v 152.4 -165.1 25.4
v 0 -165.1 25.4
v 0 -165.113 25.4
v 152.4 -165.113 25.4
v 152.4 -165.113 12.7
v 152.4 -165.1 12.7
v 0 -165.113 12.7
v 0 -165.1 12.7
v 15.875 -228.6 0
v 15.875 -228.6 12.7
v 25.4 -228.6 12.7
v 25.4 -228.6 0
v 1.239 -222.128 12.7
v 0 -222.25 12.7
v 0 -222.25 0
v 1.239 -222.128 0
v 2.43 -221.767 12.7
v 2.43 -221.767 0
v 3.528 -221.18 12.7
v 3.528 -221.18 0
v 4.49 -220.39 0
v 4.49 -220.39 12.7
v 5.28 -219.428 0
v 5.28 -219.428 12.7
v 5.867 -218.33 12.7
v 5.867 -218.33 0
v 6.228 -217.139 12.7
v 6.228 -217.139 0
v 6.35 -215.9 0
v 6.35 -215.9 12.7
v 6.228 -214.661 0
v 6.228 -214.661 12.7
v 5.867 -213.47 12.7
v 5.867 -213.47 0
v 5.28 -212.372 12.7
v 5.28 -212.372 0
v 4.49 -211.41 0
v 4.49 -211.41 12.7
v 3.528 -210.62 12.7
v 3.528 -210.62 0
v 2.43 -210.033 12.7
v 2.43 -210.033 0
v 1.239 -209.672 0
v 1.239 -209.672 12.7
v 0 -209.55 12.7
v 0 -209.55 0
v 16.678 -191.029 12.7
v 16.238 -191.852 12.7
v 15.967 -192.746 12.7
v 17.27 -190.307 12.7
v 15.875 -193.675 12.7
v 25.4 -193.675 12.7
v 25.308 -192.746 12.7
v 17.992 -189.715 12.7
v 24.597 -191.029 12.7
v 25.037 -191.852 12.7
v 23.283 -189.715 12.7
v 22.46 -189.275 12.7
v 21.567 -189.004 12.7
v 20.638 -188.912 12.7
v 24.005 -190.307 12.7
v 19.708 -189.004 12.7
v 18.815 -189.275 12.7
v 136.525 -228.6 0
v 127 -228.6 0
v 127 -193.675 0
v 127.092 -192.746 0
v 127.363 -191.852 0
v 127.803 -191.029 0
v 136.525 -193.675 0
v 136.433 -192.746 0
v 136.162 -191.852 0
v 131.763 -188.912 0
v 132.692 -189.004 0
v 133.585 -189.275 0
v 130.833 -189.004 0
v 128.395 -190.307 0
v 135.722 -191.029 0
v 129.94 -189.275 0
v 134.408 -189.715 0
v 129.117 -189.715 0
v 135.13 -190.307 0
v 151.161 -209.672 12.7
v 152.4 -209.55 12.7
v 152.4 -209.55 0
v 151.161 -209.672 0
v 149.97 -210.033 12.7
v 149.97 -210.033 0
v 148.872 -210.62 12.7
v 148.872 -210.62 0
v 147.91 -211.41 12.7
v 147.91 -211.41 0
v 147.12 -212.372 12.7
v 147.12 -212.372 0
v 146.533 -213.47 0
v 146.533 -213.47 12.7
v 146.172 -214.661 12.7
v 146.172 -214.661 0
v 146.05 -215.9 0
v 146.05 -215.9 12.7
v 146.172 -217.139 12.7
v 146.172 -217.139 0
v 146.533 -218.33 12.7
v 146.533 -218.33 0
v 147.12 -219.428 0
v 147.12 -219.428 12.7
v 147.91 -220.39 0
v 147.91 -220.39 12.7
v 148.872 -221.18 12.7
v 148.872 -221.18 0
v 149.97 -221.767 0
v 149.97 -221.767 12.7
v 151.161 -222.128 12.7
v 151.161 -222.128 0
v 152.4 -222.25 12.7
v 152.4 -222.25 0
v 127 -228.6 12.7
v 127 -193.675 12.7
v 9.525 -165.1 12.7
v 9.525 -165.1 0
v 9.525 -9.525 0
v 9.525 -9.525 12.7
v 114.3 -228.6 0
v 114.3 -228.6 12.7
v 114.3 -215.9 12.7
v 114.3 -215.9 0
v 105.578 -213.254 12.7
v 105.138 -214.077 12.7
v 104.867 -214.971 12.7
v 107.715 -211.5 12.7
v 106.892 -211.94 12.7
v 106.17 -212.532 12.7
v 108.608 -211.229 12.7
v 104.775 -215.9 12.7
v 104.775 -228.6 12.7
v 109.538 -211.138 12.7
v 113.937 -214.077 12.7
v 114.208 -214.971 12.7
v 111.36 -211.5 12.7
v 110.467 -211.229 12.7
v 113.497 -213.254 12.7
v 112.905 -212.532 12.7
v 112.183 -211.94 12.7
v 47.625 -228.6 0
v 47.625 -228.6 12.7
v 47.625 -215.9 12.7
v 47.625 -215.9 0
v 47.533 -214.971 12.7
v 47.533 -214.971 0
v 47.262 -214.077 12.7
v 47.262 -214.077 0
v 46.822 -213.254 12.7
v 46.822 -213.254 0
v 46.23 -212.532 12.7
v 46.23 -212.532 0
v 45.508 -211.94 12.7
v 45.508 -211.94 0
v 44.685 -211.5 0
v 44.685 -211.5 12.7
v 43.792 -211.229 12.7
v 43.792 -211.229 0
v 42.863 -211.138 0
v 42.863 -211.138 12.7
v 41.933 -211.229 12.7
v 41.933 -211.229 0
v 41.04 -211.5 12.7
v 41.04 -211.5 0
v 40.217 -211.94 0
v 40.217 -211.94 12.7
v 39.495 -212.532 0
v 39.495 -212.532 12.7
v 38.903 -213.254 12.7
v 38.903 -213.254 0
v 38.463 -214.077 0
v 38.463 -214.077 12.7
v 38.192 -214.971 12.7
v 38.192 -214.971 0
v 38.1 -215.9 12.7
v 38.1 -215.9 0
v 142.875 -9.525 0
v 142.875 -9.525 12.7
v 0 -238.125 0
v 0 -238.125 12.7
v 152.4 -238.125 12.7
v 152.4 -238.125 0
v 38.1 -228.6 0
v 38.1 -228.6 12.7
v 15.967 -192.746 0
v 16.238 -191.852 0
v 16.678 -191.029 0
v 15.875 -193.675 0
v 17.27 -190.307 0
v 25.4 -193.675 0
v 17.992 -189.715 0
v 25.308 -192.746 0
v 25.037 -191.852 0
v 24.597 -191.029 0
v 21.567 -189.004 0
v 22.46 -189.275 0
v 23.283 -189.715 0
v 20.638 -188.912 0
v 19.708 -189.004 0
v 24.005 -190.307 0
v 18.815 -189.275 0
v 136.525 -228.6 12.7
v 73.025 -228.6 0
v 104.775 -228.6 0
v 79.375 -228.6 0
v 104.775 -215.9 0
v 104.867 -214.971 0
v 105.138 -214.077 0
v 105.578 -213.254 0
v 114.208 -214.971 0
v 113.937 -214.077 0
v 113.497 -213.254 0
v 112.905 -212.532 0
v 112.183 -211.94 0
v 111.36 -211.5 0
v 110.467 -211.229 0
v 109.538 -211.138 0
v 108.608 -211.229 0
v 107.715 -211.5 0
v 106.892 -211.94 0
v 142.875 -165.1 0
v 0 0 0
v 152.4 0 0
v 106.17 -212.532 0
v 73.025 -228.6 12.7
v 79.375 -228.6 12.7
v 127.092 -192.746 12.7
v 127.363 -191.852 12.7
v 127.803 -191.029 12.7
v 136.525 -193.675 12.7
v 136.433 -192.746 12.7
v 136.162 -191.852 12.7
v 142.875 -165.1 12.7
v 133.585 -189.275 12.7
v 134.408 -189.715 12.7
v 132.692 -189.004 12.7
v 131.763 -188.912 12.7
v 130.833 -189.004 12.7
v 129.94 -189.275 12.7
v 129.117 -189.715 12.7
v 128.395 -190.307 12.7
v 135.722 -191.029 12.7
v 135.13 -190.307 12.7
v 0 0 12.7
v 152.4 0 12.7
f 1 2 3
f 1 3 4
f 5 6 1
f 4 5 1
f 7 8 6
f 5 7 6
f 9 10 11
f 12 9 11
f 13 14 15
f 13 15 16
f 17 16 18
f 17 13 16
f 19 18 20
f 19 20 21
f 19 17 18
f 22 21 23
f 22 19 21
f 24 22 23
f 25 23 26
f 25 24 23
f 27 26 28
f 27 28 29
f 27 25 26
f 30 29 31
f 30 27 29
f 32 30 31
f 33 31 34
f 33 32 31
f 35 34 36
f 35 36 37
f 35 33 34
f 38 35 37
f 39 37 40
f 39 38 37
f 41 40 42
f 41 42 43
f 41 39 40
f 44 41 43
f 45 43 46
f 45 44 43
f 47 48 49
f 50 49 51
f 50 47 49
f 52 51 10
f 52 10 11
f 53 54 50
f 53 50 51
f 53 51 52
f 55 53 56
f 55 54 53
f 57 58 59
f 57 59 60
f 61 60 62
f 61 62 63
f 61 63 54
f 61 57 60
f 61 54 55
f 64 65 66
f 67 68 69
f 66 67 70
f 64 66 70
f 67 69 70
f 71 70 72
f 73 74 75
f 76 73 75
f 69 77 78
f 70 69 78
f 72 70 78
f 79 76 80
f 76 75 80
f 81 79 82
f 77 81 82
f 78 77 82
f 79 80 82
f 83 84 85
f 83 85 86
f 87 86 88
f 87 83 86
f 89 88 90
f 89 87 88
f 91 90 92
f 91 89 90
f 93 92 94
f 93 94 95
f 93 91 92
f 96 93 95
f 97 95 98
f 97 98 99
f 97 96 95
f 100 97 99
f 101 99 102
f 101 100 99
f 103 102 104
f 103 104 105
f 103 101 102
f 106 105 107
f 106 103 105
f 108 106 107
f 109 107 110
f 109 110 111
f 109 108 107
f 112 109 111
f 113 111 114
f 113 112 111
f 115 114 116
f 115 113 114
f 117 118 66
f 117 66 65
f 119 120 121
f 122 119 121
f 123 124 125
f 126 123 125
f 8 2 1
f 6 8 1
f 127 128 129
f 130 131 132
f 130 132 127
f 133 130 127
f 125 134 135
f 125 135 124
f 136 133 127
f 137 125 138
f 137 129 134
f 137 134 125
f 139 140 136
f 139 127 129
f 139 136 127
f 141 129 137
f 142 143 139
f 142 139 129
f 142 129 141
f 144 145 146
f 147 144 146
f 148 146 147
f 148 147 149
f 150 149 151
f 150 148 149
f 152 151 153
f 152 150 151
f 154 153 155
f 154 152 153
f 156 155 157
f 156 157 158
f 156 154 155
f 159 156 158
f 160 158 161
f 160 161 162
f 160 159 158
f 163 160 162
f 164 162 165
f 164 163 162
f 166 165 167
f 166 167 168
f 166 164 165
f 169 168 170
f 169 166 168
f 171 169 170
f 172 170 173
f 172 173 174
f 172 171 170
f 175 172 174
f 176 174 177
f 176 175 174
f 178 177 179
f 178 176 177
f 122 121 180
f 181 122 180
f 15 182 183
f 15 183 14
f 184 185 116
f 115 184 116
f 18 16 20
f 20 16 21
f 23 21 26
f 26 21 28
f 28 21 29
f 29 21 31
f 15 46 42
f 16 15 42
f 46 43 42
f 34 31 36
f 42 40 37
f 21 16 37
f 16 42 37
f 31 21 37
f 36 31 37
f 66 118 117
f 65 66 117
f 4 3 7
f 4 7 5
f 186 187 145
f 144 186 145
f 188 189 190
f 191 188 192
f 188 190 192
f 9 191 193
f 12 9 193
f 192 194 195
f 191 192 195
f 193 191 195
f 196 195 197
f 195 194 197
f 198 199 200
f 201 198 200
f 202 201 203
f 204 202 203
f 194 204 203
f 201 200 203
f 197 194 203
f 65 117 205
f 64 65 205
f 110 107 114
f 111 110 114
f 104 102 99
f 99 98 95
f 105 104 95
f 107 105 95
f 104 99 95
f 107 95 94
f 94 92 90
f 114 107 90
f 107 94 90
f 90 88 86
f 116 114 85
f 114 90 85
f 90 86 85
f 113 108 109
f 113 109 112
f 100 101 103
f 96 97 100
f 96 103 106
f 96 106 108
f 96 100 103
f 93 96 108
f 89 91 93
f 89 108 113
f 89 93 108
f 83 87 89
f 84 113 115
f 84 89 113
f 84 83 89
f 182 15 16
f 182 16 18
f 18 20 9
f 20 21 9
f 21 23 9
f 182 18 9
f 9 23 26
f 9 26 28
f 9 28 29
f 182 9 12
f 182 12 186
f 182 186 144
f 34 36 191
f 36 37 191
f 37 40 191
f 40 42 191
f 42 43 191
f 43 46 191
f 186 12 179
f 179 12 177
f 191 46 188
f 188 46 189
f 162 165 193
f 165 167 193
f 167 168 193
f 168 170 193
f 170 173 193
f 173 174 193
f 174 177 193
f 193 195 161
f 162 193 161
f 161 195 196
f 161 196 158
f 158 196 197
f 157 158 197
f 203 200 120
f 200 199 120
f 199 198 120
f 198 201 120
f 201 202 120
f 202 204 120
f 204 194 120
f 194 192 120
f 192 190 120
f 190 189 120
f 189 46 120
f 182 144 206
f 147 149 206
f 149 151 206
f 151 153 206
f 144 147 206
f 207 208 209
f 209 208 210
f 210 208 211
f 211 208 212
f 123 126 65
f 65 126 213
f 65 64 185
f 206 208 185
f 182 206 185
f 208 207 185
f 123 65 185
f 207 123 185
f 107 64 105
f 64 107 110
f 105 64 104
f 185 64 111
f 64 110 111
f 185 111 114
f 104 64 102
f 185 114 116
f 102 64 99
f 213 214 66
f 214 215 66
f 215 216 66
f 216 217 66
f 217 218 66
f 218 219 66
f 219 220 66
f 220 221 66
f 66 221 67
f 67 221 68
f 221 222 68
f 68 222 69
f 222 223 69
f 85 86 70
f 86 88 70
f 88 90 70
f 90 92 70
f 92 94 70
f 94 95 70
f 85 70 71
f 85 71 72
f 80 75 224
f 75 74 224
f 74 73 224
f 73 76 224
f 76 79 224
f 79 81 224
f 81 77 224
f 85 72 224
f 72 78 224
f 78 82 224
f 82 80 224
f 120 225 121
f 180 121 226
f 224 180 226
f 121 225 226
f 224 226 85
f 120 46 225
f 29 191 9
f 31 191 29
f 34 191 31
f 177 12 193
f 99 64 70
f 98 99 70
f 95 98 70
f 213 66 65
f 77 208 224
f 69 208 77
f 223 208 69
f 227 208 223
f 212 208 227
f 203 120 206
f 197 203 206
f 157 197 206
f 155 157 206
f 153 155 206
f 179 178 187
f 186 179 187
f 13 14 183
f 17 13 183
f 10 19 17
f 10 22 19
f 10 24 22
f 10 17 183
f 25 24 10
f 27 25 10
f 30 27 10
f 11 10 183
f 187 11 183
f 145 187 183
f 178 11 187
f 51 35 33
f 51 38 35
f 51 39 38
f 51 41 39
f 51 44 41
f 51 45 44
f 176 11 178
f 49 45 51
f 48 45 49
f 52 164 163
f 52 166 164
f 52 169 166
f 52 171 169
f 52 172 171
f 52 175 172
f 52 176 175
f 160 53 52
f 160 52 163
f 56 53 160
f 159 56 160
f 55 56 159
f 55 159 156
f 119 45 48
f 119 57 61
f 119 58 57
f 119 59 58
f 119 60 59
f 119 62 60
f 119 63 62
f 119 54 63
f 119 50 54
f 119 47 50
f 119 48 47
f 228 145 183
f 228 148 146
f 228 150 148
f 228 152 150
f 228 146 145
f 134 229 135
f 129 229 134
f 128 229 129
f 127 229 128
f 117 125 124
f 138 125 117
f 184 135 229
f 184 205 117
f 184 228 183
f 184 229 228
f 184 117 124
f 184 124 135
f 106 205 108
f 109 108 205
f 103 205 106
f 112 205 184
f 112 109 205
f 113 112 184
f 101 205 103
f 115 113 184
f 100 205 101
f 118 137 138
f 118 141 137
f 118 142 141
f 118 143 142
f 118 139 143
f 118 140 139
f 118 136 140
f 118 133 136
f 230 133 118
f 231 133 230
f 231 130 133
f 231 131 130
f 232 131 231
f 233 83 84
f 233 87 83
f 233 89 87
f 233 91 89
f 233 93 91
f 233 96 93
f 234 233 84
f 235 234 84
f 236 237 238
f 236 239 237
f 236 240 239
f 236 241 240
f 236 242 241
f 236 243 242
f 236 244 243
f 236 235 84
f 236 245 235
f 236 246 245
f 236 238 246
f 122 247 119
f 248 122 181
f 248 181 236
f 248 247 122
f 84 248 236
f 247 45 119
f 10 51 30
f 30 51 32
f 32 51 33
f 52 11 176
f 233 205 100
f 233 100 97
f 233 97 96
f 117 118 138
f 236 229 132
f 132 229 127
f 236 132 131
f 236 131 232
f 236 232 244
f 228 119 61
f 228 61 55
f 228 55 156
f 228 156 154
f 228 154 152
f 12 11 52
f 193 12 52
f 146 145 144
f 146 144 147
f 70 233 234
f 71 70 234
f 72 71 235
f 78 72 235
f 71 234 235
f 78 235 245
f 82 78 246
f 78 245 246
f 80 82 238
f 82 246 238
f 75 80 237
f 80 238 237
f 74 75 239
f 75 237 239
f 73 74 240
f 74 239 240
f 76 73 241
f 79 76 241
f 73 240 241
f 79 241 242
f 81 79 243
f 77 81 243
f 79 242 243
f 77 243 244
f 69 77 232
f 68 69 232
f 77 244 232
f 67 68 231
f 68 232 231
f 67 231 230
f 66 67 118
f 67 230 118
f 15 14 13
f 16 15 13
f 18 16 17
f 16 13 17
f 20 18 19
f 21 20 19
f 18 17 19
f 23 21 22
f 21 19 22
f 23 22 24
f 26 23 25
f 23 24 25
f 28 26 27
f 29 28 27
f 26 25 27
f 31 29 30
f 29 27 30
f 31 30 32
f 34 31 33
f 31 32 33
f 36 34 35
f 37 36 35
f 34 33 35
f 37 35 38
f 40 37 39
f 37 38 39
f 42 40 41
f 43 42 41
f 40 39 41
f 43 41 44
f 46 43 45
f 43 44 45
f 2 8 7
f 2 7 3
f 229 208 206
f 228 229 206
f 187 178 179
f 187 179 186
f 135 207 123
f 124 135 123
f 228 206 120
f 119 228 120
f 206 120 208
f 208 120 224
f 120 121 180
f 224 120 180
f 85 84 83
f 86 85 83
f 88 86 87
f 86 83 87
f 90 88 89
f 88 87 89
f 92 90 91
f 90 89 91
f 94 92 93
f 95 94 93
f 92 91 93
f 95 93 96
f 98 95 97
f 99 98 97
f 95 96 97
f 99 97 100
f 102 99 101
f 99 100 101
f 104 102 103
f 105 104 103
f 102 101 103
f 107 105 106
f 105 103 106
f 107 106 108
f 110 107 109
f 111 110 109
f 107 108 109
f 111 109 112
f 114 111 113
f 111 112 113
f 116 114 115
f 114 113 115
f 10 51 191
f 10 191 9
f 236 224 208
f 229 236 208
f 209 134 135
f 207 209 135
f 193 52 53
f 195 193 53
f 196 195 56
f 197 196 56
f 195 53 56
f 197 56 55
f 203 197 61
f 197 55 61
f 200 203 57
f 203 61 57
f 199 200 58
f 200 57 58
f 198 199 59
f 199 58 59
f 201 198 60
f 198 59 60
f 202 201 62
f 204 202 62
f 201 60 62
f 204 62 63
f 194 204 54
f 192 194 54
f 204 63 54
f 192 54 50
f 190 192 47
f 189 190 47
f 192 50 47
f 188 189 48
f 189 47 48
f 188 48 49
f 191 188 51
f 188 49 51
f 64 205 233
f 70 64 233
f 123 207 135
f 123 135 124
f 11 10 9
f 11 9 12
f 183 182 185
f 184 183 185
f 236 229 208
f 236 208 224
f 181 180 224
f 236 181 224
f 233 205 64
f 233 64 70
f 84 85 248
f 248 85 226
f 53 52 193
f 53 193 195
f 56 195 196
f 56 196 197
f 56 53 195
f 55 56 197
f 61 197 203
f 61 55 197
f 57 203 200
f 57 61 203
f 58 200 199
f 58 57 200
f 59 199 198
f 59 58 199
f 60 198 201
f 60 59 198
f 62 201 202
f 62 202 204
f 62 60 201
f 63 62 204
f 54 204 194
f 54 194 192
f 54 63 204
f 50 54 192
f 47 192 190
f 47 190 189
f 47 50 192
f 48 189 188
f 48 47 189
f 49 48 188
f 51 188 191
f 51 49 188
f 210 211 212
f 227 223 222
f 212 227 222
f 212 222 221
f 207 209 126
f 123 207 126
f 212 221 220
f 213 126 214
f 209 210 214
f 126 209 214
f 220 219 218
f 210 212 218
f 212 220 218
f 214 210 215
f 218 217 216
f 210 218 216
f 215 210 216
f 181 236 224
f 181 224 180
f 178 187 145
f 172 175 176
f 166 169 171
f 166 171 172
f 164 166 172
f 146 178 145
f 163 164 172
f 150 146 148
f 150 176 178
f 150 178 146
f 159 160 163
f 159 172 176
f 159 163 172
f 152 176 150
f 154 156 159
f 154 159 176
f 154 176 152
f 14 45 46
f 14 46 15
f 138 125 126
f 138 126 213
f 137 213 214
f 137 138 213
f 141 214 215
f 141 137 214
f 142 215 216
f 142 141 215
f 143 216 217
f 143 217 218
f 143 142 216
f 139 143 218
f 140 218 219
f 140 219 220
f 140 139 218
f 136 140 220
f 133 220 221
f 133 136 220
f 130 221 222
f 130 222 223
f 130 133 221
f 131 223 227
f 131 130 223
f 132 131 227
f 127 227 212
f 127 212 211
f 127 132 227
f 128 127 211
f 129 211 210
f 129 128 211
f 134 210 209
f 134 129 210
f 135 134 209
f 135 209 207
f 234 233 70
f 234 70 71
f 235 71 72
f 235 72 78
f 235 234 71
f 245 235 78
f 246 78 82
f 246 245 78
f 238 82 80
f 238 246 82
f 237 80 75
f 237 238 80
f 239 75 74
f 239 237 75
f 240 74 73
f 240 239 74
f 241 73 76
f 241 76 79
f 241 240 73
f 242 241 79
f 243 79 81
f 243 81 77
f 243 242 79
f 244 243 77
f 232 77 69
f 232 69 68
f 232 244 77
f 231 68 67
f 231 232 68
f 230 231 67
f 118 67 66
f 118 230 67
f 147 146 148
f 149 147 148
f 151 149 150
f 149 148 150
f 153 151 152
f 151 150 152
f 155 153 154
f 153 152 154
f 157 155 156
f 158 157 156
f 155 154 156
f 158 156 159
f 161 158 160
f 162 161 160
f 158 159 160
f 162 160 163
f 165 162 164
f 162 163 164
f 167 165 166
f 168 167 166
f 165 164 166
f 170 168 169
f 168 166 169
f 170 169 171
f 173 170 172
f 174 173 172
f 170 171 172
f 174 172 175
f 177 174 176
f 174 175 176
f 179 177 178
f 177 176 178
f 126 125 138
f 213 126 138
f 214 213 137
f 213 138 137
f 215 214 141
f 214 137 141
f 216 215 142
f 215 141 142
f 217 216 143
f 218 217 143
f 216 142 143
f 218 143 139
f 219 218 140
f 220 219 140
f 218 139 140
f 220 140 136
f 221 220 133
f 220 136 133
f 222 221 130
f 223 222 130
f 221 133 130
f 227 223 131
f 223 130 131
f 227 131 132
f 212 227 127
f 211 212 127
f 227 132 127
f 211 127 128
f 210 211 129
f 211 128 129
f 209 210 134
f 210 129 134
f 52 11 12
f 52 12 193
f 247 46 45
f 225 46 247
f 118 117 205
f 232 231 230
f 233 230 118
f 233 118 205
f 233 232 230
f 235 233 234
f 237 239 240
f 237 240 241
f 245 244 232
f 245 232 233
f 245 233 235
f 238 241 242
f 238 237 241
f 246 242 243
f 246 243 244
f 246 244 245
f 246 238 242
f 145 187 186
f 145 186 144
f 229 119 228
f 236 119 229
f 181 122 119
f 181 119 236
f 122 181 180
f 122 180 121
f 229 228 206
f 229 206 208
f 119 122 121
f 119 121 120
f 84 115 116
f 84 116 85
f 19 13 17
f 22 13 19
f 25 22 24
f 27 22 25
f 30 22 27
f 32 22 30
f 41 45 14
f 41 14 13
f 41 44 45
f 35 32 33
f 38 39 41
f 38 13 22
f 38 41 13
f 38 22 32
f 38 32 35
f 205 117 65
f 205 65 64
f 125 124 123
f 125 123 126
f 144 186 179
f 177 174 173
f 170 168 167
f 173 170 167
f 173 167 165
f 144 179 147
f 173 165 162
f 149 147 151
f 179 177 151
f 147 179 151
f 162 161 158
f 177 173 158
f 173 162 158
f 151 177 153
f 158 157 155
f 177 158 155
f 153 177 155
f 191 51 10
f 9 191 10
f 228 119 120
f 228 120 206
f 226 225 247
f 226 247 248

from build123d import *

# Parameters (mm, degrees)
F0_W      = 152.4
F0_H      = 238.125
F1_DEPTH  = 12.7
F3_DEPTH  = 12.7
F5_DEPTH  = 25.4
F7_DEPTH  = 12.7
F9_DEPTH  = 12.7
F11_E36_W = 152.4
F11_E36_H = 12.7
F12_DEPTH = 0.0127


with BuildPart() as f1:
    # F0 (on Top) → F1 (new body)
    with BuildSketch(Plane.XY):
        with Locations((76.2, -119.0625)):
            Rectangle(F0_W, F0_H)
        Polygon((9.525, -9.525), (142.875, -9.525), (142.875, -165.1), (79.375, -228.6), (73.025, -228.6), (9.525, -165.1), align=None, mode=Mode.SUBTRACT)
    extrude(amount=F1_DEPTH)

    # F2 (on face) → F3 (cut, through all)
    with BuildSketch(Plane.XY.offset(12.7)):
        with BuildLine():
            Line((0, -209.55), (0, -222.25))
            ThreePointArc((0, -222.25), (6.35, -215.9), (0, -209.55))
        make_face()
        with BuildLine():
            ThreePointArc((152.4, -209.55), (146.05, -215.9), (152.4, -222.25))
            Line((152.4, -222.25), (152.4, -209.55))
        make_face()
    extrude(amount=-F3_DEPTH, mode=Mode.SUBTRACT)

    # F4 (on face) → F5 (cut)
    with BuildSketch(Plane.XY.offset(12.7)):
        with BuildLine():
            Line((15.875, -193.675), (15.875, -228.6))
            Line((15.875, -228.6), (25.4, -228.6))
            Line((25.4, -228.6), (25.4, -193.675))
            ThreePointArc((25.4, -193.675), (20.6375, -188.9125), (15.875, -193.675))
        make_face()
        with BuildLine():
            Line((38.1, -215.9), (38.1, -228.6))
            Line((38.1, -228.6), (47.625, -228.6))
            Line((47.625, -228.6), (47.625, -215.9))
            ThreePointArc((47.625, -215.9), (42.8625, -211.1375), (38.1, -215.9))
        make_face()
        with BuildLine():
            ThreePointArc((136.525, -193.675), (131.7625, -188.9125), (127, -193.675))
            Line((127, -193.675), (127, -228.6))
            Line((127, -228.6), (136.525, -228.6))
            Line((136.525, -228.6), (136.525, -193.675))
        make_face()
        with BuildLine():
            Line((104.775, -215.9), (104.775, -228.6))
            Line((104.775, -228.6), (114.3, -228.6))
            Line((114.3, -228.6), (114.3, -215.9))
            ThreePointArc((114.3, -215.9), (109.5375, -211.1375), (104.775, -215.9))
        make_face()
    extrude(amount=-F5_DEPTH, mode=Mode.SUBTRACT)


with BuildPart() as f7:
    # F6 (on face) → F7 (new body)
    with BuildSketch(Plane.XY.offset(12.7)):
        Polygon((9.525, -9.525), (9.525, -165.1), (73.025, -228.6), (79.375, -228.6), (142.875, -165.1), (142.875, -9.525), align=None)
    extrude(amount=-F7_DEPTH)


with BuildPart() as f7b:
    # F6 (on face) → F7, piece 2 (new body)
    with BuildSketch(Plane.XY.offset(12.7)):
        with BuildLine():
            Line((15.875, -193.675), (15.875, -228.6))
            Line((15.875, -228.6), (25.4, -228.6))
            Line((25.4, -228.6), (25.4, -193.675))
            ThreePointArc((25.4, -193.675), (20.6375, -188.9125), (15.875, -193.675))
        make_face()
    extrude(amount=-F7_DEPTH)


with BuildPart() as f7c:
    # F6 (on face) → F7, piece 3 (new body)
    with BuildSketch(Plane.XY.offset(12.7)):
        with BuildLine():
            Line((47.625, -228.6), (47.625, -215.9))
            ThreePointArc((47.625, -215.9), (42.8625, -211.1375), (38.1, -215.9))
            Line((38.1, -215.9), (38.1, -228.6))
            Line((38.1, -228.6), (47.625, -228.6))
        make_face()
    extrude(amount=-F7_DEPTH)


with BuildPart() as f7d:
    # F6 (on face) → F7, piece 4 (new body)
    with BuildSketch(Plane.XY.offset(12.7)):
        with BuildLine():
            Line((104.775, -215.9), (104.775, -228.6))
            Line((104.775, -228.6), (114.3, -228.6))
            Line((114.3, -228.6), (114.3, -215.9))
            ThreePointArc((114.3, -215.9), (109.5375, -211.1375), (104.775, -215.9))
        make_face()
    extrude(amount=-F7_DEPTH)


with BuildPart() as f7e:
    # F6 (on face) → F7, piece 5 (new body)
    with BuildSketch(Plane.XY.offset(12.7)):
        with BuildLine():
            ThreePointArc((136.525, -193.675), (131.7625, -188.9125), (127, -193.675))
            Line((127, -193.675), (127, -228.6))
            Line((127, -228.6), (136.525, -228.6))
            Line((136.525, -228.6), (136.525, -193.675))
        make_face()
    extrude(amount=-F7_DEPTH)


with BuildPart() as f9:
    # F8 (on face) → F9 (new body)
    with BuildSketch(Plane.XY.offset(12.7)):
        with BuildLine():
            Line((0, -209.55), (0, -222.25))
            ThreePointArc((0, -222.25), (6.35, -215.9), (0, -209.55))
        make_face()
    extrude(amount=-F9_DEPTH)


with BuildPart() as f9b:
    # F8 (on face) → F9, piece 2 (new body)
    with BuildSketch(Plane.XY.offset(12.7)):
        with BuildLine():
            Line((152.4, -222.25), (152.4, -209.55))
            ThreePointArc((152.4, -209.55), (146.05, -215.9), (152.4, -222.25))
        make_face()
    extrude(amount=-F9_DEPTH)


with BuildPart() as f12:
    # F11_E36 (on explicit) → F12 (new body)
    with BuildSketch(Plane(origin=(0, -165.1, 12.7), x_dir=(1, 0, 0), z_dir=(0, -1, 0))):
        with Locations((76.2, 6.35)):
            Rectangle(F11_E36_W, F11_E36_H)
    extrude(amount=F12_DEPTH)


solid = Compound([f1.part, f7.part, f7b.part, f7c.part, f7d.part, f7e.part, f9.part, f9b.part, f12.part])
